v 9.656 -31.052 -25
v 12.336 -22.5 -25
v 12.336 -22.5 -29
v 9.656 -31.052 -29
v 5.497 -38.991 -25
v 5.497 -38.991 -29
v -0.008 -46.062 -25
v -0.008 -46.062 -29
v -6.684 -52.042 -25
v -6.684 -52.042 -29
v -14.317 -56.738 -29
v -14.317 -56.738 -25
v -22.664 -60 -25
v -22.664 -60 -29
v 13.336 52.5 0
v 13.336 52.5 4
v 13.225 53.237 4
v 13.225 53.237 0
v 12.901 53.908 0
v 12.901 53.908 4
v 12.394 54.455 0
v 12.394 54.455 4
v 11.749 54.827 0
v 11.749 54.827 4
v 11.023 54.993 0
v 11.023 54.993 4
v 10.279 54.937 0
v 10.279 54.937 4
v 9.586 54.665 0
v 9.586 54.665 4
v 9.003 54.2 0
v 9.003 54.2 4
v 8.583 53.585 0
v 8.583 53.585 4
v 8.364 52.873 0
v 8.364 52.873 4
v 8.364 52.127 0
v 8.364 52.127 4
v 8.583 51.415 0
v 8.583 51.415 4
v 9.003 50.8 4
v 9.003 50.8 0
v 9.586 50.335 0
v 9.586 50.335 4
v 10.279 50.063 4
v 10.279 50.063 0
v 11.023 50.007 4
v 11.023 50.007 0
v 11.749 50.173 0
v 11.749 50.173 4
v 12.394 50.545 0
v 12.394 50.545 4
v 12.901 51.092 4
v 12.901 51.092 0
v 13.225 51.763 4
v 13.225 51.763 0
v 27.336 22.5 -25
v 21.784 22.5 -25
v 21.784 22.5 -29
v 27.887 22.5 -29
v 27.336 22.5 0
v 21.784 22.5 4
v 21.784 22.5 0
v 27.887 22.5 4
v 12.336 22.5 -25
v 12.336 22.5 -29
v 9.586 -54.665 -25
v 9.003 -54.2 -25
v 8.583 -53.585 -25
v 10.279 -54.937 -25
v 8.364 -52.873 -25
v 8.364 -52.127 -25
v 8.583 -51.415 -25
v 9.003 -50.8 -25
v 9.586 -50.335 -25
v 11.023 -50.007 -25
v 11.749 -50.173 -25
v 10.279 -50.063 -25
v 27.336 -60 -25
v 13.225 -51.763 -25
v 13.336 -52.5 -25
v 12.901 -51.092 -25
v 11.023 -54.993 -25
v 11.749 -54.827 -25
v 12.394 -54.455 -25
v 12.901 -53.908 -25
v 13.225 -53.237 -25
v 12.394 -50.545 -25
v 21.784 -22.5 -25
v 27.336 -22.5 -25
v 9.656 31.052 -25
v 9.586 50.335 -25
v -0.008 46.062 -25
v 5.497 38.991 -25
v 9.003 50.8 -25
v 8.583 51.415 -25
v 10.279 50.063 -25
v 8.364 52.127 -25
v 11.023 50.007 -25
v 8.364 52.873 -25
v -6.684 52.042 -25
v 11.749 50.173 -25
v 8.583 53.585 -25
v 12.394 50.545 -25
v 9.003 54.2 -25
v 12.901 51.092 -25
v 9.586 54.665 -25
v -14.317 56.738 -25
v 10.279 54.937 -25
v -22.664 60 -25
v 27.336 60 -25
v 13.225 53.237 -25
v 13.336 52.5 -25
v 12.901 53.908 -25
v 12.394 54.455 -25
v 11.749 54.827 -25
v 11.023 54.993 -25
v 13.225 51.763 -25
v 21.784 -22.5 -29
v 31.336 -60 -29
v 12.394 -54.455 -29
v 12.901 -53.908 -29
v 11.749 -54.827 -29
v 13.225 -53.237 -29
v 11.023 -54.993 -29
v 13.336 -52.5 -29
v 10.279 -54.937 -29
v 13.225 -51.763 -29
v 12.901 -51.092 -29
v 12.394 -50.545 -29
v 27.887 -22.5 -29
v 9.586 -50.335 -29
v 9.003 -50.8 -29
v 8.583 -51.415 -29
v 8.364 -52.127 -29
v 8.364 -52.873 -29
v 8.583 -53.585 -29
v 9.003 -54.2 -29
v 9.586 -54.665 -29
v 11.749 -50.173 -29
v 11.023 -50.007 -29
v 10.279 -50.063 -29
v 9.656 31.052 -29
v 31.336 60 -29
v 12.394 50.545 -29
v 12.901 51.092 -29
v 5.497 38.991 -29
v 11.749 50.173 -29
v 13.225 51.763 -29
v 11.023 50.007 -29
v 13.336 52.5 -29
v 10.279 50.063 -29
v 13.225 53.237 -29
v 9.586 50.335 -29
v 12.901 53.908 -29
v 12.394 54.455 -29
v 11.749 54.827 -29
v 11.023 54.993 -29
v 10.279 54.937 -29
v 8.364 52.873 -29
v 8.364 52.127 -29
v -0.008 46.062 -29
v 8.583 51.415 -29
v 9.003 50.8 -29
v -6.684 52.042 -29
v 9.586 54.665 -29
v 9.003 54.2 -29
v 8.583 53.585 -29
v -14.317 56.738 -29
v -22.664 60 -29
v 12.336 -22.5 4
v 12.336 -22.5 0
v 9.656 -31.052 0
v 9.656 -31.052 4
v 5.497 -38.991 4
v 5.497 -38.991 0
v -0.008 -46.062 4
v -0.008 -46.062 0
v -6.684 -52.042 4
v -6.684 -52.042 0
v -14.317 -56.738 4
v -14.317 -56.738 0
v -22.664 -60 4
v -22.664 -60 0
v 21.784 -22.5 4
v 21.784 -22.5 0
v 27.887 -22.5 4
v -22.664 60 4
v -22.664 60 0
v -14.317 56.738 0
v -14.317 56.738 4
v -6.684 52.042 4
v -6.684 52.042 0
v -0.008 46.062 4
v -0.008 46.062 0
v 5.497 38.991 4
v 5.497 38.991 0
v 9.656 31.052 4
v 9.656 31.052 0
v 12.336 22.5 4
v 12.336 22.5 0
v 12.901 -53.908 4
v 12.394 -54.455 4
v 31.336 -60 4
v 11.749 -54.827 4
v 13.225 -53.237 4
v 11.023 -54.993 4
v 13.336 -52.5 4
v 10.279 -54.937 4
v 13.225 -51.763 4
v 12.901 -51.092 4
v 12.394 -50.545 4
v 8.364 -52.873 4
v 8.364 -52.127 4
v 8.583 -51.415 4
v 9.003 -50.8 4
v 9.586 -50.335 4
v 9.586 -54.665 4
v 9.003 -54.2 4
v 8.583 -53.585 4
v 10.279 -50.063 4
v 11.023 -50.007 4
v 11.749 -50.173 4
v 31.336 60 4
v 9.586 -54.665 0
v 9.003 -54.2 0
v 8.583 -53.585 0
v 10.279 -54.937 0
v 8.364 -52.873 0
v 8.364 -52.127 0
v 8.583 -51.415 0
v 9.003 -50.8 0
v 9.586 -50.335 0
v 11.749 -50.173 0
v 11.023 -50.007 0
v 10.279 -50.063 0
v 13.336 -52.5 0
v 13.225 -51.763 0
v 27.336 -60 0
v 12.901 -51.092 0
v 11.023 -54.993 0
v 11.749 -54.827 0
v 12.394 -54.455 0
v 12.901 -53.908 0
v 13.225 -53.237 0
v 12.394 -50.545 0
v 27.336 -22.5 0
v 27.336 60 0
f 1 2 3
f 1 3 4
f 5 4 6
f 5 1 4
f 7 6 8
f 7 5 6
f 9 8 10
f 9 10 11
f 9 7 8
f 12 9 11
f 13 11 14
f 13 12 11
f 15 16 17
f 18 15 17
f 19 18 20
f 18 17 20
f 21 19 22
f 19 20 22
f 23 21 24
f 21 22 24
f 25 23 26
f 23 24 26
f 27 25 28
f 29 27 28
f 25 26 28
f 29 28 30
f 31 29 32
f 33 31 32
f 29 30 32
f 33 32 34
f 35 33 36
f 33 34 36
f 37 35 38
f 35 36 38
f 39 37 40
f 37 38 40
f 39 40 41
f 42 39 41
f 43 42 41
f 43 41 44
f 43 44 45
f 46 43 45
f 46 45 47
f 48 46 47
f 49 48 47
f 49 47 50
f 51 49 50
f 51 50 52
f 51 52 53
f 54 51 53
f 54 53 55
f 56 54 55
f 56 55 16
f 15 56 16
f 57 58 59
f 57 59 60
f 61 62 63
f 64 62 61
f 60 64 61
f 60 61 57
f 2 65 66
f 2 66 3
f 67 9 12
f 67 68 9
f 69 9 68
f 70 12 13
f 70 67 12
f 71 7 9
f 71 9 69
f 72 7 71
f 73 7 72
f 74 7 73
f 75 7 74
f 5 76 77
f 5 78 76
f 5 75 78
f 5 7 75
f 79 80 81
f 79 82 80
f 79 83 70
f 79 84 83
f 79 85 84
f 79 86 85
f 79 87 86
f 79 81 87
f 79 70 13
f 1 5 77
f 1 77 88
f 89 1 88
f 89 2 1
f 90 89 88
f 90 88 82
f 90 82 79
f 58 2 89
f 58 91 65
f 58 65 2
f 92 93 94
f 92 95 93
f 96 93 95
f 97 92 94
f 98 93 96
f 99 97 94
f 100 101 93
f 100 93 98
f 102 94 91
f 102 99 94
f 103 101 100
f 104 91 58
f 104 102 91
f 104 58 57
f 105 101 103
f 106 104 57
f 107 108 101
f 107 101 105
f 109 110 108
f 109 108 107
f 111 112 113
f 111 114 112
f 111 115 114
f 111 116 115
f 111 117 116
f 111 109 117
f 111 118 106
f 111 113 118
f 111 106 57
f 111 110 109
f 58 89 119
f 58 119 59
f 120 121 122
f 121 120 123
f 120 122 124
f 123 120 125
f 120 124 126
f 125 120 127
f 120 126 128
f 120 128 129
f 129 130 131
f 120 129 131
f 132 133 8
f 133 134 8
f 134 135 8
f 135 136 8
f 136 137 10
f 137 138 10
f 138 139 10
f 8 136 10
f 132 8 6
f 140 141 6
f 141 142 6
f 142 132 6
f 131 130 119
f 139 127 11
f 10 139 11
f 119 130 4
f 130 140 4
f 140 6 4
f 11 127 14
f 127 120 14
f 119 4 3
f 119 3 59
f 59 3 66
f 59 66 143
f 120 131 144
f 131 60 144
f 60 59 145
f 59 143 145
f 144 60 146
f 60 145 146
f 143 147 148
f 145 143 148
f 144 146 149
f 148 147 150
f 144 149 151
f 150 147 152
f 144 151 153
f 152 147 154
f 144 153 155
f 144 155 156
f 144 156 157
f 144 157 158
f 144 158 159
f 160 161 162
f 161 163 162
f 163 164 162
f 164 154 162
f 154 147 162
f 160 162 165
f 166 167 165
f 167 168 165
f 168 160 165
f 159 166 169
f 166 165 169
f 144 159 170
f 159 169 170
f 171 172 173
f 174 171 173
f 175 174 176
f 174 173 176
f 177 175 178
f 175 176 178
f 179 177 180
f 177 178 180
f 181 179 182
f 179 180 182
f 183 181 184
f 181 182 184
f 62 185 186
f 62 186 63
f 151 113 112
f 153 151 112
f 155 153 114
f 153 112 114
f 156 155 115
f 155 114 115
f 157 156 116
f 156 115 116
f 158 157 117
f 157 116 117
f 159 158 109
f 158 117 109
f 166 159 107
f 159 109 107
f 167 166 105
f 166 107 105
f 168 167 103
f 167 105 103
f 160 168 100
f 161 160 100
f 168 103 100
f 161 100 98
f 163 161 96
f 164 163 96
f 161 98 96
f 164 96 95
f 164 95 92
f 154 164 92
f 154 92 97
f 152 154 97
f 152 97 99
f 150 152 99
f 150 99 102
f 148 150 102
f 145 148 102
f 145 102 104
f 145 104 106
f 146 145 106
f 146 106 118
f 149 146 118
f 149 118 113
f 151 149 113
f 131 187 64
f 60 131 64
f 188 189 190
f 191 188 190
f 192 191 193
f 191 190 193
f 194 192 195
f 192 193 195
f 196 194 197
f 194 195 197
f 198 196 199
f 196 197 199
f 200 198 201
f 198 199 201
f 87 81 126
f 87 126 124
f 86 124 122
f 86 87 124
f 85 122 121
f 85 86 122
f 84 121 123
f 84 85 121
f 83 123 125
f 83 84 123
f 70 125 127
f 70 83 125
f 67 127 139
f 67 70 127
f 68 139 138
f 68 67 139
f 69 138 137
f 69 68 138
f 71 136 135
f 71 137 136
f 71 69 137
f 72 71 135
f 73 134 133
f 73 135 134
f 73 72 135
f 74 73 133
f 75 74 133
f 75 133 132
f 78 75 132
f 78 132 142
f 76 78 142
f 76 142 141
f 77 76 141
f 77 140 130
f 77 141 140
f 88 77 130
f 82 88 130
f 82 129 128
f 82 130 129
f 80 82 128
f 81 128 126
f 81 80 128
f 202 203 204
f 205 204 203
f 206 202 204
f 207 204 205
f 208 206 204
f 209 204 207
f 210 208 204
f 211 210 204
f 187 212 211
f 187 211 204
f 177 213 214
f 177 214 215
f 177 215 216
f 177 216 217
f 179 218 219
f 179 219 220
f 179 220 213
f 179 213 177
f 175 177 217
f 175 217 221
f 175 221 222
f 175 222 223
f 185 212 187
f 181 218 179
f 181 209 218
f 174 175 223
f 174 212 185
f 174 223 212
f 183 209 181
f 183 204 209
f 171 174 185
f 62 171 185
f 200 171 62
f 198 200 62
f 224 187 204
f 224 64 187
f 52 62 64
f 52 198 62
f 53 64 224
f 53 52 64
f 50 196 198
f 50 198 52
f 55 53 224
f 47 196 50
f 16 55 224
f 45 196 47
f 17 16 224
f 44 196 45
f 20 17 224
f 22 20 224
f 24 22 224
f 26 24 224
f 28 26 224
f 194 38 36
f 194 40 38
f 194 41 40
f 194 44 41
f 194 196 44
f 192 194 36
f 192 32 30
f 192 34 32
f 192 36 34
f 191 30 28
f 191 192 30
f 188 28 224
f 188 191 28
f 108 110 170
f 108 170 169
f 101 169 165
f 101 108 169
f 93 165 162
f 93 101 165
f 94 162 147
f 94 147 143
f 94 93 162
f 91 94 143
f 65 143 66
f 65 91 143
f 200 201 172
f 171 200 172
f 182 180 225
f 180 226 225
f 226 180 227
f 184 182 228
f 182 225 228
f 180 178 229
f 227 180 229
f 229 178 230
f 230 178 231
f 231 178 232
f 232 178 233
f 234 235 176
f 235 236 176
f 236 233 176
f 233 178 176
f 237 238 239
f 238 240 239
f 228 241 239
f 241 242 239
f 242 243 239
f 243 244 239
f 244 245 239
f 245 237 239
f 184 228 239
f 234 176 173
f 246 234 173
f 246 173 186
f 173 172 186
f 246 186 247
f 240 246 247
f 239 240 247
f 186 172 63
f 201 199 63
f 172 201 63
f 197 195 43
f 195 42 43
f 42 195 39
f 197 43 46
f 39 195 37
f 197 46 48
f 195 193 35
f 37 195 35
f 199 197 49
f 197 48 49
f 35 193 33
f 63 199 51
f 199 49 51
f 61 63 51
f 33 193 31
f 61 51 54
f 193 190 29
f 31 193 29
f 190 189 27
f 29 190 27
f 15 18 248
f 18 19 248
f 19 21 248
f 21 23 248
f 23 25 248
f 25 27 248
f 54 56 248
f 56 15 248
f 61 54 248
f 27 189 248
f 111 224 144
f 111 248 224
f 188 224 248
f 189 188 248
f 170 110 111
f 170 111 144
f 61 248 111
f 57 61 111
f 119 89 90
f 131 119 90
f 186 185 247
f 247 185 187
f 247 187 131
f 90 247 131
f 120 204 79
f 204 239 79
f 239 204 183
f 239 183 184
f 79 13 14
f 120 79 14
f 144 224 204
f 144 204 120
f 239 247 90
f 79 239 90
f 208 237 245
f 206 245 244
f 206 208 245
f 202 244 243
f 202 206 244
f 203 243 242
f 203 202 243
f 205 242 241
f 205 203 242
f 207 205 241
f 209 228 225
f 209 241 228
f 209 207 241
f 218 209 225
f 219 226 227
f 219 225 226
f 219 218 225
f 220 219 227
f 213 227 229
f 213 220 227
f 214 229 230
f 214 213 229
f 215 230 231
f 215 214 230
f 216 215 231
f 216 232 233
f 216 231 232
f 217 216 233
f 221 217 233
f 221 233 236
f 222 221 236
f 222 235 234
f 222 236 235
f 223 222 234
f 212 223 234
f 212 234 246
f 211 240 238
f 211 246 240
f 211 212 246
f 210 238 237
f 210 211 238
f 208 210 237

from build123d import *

# Parameters (mm, degrees)
SKETCH3_W           = 13
SKETCH3_H           = 120
BOSS_EXTRUDE1_DEPTH = 4
SKETCH11_W          = 33
SKETCH11_H          = 120
BOSS_EXTRUDE4_DEPTH = 4
SKETCH12_R          = 2.5
CUT_EXTRUDE3_DEPTH  = 76.305579191
SKETCH13_W          = 6.102814475
SKETCH13_H          = 45
CUT_EXTRUDE4_DEPTH  = 76.305579191


with BuildPart() as part:
    # Sketch3 → Boss-Extrude1 (new body)
    with BuildSketch(Plane.XY):
        with Locations((20.835766423, 0)):
            Rectangle(SKETCH3_W, SKETCH3_H)
        with BuildLine():
            Line((14.335766423, 0), (14.335766423, 60))
            Line((14.335766423, 60), (-22.664233577, 60))
            ThreePointArc((-22.664233577, 60), (-0.008037132, 46.062450015), (12.335766423, 22.5))
            Line((12.335766423, 22.5), (12.335766423, 0))
            Line((12.335766423, 0), (14.335766423, 0))
        make_face()
        with BuildLine():
            Line((14.335766423, -60), (14.335766423, 0))
            Line((14.335766423, 0), (12.335766423, 0))
            Line((12.335766423, 0), (12.335766423, -22.5))
            ThreePointArc((12.335766423, -22.5), (-0.008037132, -46.062450015), (-22.664233577, -60))
            Line((-22.664233577, -60), (14.335766423, -60))
        make_face()
    extrude(amount=BOSS_EXTRUDE1_DEPTH)


with BuildPart() as body_2:
    # Mirror4: mirrored copy
    add(part.part.mirror(Plane.XY.offset(-12.5)))


with BuildPart() as part_1:
    add(part.part)

    add(body_2.part)  # Boss-Extrude4 merges body 2
    # Sketch11 → Boss-Extrude4 (add)
    with BuildSketch(Plane(origin=(27.335766423, 0, 0), x_dir=(0, 0, -1), z_dir=(1, 0, 0))):
        with Locations((12.5, 0)):
            Rectangle(SKETCH11_W, SKETCH11_H)
    extrude(amount=BOSS_EXTRUDE4_DEPTH)

    # Sketch12 → Cut-Extrude3 (cut, through all)
    with BuildSketch(Plane.XY.offset(4)):
        with Locations((10.835766423, 52.5)):
            Circle(SKETCH12_R)
    cut_extrude3 = extrude(amount=-CUT_EXTRUDE3_DEPTH, mode=Mode.SUBTRACT)

    # Mirror5: Cut-Extrude3 across plane
    add(cut_extrude3.mirror(Plane.ZX), mode=Mode.SUBTRACT)

    # Sketch13 → Cut-Extrude4 (cut, through all)
    with BuildSketch(Plane.XY.offset(4)):
        with Locations((24.835766424, 0)):
            Rectangle(SKETCH13_W, SKETCH13_H)
    extrude(amount=-CUT_EXTRUDE4_DEPTH, mode=Mode.SUBTRACT)


solid = part_1.part
